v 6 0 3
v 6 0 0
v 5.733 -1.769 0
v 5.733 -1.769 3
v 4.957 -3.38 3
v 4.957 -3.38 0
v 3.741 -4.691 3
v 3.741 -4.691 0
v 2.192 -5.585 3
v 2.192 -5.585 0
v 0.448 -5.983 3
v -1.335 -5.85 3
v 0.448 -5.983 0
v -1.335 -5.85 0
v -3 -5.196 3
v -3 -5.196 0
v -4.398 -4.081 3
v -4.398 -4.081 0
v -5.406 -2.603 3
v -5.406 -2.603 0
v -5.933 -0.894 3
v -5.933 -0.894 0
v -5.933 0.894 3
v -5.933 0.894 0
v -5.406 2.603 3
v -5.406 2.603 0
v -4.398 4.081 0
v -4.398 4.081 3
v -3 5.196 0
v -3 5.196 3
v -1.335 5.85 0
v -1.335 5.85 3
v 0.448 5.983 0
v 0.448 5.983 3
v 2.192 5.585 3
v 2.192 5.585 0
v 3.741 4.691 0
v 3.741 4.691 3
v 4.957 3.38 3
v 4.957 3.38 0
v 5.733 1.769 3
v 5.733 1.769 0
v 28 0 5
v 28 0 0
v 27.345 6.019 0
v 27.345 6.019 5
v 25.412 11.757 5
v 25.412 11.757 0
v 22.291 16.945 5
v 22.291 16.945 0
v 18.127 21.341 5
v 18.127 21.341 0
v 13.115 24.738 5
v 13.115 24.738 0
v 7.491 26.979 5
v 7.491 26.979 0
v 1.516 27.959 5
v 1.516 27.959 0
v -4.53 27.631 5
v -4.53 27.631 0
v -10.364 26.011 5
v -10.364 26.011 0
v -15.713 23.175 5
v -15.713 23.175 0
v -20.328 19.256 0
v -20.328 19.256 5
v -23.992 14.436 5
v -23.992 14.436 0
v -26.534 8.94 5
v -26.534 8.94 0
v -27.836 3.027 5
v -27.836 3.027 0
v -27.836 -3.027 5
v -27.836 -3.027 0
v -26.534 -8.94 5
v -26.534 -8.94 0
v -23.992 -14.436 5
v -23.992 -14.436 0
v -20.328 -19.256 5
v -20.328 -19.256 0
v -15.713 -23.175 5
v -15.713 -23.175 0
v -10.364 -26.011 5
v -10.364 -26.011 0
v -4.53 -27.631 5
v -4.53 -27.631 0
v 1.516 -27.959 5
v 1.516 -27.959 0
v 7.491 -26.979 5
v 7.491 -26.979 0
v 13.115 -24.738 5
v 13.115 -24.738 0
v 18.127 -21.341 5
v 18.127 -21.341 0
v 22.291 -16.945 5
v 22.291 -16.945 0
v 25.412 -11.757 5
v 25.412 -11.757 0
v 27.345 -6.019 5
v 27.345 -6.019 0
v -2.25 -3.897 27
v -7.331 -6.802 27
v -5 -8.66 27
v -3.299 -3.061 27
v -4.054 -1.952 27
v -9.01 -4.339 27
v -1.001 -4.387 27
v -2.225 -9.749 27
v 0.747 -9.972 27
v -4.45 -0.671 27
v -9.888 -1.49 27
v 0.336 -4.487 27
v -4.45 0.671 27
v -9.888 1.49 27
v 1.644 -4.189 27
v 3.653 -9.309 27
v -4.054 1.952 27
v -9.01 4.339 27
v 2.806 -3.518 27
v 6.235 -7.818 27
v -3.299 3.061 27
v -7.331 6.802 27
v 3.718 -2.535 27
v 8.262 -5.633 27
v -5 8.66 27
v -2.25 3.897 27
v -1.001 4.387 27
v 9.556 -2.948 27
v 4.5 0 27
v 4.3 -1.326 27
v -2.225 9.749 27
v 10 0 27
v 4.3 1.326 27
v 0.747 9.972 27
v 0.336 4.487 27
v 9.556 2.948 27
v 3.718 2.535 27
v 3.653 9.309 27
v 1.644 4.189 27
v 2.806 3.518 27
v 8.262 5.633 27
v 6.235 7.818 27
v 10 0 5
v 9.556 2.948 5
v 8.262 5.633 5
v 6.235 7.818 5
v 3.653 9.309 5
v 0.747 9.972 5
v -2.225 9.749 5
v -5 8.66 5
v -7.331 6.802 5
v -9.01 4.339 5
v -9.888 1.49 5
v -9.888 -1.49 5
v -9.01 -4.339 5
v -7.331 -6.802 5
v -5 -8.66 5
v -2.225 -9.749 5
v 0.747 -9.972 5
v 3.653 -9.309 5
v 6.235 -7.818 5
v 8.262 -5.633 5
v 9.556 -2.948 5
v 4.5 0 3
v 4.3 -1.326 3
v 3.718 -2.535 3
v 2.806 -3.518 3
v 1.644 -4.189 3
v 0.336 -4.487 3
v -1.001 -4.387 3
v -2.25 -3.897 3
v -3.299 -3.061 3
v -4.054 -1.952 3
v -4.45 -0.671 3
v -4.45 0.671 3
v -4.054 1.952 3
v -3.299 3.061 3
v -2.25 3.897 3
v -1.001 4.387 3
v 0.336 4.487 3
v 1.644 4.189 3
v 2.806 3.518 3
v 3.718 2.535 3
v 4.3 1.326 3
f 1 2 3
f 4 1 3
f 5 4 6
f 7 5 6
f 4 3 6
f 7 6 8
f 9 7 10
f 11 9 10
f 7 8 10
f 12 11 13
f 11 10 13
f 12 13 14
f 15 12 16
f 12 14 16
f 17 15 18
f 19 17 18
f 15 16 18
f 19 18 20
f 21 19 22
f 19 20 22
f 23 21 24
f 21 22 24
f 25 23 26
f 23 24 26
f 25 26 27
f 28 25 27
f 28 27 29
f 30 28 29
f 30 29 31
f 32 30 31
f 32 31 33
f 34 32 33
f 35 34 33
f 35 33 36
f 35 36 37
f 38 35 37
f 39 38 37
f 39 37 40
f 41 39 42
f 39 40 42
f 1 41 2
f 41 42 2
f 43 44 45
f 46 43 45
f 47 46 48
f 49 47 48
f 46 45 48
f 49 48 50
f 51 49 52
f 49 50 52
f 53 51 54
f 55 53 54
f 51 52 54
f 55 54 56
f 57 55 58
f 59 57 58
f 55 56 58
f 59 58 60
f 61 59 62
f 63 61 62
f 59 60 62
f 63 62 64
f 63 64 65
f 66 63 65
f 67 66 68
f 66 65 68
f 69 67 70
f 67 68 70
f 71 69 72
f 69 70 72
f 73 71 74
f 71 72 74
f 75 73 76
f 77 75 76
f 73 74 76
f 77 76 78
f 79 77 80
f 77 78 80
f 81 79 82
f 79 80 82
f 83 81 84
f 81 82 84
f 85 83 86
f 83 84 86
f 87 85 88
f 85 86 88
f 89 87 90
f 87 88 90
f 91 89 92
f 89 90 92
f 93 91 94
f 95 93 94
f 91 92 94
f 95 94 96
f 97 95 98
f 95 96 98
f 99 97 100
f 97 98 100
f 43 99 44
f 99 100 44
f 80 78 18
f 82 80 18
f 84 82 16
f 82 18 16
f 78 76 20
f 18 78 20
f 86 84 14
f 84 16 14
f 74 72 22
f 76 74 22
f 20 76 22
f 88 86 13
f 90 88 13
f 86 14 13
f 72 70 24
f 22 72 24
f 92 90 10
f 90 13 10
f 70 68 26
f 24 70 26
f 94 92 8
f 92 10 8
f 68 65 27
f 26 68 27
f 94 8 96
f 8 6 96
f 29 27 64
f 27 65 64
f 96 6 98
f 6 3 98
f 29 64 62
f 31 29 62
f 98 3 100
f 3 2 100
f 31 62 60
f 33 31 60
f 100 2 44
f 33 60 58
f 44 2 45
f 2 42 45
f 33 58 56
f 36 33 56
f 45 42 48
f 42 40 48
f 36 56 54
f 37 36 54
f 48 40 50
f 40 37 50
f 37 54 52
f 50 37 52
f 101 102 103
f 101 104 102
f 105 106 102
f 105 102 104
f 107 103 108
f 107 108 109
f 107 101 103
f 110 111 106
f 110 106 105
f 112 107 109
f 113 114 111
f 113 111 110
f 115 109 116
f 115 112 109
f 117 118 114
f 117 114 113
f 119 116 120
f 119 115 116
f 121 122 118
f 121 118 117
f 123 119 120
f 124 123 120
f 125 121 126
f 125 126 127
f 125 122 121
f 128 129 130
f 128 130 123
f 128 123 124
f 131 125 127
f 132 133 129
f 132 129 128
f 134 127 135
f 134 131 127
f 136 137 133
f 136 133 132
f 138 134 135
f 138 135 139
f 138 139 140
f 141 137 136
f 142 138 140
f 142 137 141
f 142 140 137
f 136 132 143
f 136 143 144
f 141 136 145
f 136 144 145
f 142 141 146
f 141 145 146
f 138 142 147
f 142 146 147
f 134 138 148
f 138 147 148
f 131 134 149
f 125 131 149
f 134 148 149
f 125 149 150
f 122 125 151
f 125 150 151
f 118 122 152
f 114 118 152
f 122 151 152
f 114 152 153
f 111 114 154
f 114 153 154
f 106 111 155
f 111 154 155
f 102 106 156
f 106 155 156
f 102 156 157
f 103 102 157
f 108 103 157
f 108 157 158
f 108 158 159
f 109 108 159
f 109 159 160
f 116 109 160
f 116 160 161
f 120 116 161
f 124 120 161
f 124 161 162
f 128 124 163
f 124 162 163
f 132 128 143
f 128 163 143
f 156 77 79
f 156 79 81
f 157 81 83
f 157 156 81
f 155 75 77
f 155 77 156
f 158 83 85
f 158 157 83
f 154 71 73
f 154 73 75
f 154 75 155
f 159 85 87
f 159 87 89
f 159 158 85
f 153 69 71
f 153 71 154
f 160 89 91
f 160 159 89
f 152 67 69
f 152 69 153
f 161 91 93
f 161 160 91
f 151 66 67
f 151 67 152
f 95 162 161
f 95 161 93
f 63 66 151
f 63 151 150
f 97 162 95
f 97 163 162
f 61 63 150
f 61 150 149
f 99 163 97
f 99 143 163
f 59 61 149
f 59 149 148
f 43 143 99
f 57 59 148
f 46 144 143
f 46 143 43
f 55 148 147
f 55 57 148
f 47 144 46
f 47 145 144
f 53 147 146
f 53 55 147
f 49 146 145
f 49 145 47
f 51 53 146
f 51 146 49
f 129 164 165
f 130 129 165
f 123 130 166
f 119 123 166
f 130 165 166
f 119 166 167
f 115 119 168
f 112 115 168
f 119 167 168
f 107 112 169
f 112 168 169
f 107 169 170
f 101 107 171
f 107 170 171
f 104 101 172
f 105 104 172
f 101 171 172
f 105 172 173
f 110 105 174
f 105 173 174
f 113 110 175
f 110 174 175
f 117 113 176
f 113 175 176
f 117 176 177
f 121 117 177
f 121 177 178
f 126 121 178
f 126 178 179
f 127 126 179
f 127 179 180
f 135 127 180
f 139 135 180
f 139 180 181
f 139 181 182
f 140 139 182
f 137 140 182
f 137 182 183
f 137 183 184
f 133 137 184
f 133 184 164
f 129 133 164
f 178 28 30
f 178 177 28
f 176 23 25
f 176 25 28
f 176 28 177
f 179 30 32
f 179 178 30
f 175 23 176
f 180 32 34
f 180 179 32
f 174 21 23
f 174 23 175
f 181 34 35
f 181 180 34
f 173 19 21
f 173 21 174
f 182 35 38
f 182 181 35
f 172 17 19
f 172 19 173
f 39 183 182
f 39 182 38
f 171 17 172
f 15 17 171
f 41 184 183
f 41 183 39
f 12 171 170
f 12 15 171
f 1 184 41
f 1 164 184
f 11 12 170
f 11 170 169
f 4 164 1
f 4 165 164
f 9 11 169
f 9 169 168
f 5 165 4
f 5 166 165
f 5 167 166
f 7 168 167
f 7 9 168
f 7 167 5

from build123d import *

# Parameters (mm, degrees)
F0_R     = 28
F1_DEPTH = 5
F2_R     = 10
F3_DEPTH = 22
F4_R     = 6
F5_DEPTH = 3
F6_R     = 4.5
F7_DEPTH = 27


with BuildPart() as f1:
    # F0 (on Top) → F1 (new body)
    with BuildSketch(Plane.XY):
        Circle(F0_R)
    extrude(amount=F1_DEPTH)

    # F2 (on face) → F3 (join)
    with BuildSketch(Plane.XY.offset(5)):
        Circle(F2_R)
    extrude(amount=F3_DEPTH)

    # F4 (on face) → F5 (cut)
    with BuildSketch(Plane(origin=(0, 0, 0), x_dir=(1, 0, 0), z_dir=(0, 0, -1))):
        Circle(F4_R)
    extrude(amount=-F5_DEPTH, mode=Mode.SUBTRACT)

    # F6 (on face) → F7 (cut)
    with BuildSketch(Plane(origin=(0, 0, 0), x_dir=(1, 0, 0), z_dir=(0, 0, -1))):
        Circle(F6_R)
    extrude(amount=-F7_DEPTH, mode=Mode.SUBTRACT)


solid = f1.part
